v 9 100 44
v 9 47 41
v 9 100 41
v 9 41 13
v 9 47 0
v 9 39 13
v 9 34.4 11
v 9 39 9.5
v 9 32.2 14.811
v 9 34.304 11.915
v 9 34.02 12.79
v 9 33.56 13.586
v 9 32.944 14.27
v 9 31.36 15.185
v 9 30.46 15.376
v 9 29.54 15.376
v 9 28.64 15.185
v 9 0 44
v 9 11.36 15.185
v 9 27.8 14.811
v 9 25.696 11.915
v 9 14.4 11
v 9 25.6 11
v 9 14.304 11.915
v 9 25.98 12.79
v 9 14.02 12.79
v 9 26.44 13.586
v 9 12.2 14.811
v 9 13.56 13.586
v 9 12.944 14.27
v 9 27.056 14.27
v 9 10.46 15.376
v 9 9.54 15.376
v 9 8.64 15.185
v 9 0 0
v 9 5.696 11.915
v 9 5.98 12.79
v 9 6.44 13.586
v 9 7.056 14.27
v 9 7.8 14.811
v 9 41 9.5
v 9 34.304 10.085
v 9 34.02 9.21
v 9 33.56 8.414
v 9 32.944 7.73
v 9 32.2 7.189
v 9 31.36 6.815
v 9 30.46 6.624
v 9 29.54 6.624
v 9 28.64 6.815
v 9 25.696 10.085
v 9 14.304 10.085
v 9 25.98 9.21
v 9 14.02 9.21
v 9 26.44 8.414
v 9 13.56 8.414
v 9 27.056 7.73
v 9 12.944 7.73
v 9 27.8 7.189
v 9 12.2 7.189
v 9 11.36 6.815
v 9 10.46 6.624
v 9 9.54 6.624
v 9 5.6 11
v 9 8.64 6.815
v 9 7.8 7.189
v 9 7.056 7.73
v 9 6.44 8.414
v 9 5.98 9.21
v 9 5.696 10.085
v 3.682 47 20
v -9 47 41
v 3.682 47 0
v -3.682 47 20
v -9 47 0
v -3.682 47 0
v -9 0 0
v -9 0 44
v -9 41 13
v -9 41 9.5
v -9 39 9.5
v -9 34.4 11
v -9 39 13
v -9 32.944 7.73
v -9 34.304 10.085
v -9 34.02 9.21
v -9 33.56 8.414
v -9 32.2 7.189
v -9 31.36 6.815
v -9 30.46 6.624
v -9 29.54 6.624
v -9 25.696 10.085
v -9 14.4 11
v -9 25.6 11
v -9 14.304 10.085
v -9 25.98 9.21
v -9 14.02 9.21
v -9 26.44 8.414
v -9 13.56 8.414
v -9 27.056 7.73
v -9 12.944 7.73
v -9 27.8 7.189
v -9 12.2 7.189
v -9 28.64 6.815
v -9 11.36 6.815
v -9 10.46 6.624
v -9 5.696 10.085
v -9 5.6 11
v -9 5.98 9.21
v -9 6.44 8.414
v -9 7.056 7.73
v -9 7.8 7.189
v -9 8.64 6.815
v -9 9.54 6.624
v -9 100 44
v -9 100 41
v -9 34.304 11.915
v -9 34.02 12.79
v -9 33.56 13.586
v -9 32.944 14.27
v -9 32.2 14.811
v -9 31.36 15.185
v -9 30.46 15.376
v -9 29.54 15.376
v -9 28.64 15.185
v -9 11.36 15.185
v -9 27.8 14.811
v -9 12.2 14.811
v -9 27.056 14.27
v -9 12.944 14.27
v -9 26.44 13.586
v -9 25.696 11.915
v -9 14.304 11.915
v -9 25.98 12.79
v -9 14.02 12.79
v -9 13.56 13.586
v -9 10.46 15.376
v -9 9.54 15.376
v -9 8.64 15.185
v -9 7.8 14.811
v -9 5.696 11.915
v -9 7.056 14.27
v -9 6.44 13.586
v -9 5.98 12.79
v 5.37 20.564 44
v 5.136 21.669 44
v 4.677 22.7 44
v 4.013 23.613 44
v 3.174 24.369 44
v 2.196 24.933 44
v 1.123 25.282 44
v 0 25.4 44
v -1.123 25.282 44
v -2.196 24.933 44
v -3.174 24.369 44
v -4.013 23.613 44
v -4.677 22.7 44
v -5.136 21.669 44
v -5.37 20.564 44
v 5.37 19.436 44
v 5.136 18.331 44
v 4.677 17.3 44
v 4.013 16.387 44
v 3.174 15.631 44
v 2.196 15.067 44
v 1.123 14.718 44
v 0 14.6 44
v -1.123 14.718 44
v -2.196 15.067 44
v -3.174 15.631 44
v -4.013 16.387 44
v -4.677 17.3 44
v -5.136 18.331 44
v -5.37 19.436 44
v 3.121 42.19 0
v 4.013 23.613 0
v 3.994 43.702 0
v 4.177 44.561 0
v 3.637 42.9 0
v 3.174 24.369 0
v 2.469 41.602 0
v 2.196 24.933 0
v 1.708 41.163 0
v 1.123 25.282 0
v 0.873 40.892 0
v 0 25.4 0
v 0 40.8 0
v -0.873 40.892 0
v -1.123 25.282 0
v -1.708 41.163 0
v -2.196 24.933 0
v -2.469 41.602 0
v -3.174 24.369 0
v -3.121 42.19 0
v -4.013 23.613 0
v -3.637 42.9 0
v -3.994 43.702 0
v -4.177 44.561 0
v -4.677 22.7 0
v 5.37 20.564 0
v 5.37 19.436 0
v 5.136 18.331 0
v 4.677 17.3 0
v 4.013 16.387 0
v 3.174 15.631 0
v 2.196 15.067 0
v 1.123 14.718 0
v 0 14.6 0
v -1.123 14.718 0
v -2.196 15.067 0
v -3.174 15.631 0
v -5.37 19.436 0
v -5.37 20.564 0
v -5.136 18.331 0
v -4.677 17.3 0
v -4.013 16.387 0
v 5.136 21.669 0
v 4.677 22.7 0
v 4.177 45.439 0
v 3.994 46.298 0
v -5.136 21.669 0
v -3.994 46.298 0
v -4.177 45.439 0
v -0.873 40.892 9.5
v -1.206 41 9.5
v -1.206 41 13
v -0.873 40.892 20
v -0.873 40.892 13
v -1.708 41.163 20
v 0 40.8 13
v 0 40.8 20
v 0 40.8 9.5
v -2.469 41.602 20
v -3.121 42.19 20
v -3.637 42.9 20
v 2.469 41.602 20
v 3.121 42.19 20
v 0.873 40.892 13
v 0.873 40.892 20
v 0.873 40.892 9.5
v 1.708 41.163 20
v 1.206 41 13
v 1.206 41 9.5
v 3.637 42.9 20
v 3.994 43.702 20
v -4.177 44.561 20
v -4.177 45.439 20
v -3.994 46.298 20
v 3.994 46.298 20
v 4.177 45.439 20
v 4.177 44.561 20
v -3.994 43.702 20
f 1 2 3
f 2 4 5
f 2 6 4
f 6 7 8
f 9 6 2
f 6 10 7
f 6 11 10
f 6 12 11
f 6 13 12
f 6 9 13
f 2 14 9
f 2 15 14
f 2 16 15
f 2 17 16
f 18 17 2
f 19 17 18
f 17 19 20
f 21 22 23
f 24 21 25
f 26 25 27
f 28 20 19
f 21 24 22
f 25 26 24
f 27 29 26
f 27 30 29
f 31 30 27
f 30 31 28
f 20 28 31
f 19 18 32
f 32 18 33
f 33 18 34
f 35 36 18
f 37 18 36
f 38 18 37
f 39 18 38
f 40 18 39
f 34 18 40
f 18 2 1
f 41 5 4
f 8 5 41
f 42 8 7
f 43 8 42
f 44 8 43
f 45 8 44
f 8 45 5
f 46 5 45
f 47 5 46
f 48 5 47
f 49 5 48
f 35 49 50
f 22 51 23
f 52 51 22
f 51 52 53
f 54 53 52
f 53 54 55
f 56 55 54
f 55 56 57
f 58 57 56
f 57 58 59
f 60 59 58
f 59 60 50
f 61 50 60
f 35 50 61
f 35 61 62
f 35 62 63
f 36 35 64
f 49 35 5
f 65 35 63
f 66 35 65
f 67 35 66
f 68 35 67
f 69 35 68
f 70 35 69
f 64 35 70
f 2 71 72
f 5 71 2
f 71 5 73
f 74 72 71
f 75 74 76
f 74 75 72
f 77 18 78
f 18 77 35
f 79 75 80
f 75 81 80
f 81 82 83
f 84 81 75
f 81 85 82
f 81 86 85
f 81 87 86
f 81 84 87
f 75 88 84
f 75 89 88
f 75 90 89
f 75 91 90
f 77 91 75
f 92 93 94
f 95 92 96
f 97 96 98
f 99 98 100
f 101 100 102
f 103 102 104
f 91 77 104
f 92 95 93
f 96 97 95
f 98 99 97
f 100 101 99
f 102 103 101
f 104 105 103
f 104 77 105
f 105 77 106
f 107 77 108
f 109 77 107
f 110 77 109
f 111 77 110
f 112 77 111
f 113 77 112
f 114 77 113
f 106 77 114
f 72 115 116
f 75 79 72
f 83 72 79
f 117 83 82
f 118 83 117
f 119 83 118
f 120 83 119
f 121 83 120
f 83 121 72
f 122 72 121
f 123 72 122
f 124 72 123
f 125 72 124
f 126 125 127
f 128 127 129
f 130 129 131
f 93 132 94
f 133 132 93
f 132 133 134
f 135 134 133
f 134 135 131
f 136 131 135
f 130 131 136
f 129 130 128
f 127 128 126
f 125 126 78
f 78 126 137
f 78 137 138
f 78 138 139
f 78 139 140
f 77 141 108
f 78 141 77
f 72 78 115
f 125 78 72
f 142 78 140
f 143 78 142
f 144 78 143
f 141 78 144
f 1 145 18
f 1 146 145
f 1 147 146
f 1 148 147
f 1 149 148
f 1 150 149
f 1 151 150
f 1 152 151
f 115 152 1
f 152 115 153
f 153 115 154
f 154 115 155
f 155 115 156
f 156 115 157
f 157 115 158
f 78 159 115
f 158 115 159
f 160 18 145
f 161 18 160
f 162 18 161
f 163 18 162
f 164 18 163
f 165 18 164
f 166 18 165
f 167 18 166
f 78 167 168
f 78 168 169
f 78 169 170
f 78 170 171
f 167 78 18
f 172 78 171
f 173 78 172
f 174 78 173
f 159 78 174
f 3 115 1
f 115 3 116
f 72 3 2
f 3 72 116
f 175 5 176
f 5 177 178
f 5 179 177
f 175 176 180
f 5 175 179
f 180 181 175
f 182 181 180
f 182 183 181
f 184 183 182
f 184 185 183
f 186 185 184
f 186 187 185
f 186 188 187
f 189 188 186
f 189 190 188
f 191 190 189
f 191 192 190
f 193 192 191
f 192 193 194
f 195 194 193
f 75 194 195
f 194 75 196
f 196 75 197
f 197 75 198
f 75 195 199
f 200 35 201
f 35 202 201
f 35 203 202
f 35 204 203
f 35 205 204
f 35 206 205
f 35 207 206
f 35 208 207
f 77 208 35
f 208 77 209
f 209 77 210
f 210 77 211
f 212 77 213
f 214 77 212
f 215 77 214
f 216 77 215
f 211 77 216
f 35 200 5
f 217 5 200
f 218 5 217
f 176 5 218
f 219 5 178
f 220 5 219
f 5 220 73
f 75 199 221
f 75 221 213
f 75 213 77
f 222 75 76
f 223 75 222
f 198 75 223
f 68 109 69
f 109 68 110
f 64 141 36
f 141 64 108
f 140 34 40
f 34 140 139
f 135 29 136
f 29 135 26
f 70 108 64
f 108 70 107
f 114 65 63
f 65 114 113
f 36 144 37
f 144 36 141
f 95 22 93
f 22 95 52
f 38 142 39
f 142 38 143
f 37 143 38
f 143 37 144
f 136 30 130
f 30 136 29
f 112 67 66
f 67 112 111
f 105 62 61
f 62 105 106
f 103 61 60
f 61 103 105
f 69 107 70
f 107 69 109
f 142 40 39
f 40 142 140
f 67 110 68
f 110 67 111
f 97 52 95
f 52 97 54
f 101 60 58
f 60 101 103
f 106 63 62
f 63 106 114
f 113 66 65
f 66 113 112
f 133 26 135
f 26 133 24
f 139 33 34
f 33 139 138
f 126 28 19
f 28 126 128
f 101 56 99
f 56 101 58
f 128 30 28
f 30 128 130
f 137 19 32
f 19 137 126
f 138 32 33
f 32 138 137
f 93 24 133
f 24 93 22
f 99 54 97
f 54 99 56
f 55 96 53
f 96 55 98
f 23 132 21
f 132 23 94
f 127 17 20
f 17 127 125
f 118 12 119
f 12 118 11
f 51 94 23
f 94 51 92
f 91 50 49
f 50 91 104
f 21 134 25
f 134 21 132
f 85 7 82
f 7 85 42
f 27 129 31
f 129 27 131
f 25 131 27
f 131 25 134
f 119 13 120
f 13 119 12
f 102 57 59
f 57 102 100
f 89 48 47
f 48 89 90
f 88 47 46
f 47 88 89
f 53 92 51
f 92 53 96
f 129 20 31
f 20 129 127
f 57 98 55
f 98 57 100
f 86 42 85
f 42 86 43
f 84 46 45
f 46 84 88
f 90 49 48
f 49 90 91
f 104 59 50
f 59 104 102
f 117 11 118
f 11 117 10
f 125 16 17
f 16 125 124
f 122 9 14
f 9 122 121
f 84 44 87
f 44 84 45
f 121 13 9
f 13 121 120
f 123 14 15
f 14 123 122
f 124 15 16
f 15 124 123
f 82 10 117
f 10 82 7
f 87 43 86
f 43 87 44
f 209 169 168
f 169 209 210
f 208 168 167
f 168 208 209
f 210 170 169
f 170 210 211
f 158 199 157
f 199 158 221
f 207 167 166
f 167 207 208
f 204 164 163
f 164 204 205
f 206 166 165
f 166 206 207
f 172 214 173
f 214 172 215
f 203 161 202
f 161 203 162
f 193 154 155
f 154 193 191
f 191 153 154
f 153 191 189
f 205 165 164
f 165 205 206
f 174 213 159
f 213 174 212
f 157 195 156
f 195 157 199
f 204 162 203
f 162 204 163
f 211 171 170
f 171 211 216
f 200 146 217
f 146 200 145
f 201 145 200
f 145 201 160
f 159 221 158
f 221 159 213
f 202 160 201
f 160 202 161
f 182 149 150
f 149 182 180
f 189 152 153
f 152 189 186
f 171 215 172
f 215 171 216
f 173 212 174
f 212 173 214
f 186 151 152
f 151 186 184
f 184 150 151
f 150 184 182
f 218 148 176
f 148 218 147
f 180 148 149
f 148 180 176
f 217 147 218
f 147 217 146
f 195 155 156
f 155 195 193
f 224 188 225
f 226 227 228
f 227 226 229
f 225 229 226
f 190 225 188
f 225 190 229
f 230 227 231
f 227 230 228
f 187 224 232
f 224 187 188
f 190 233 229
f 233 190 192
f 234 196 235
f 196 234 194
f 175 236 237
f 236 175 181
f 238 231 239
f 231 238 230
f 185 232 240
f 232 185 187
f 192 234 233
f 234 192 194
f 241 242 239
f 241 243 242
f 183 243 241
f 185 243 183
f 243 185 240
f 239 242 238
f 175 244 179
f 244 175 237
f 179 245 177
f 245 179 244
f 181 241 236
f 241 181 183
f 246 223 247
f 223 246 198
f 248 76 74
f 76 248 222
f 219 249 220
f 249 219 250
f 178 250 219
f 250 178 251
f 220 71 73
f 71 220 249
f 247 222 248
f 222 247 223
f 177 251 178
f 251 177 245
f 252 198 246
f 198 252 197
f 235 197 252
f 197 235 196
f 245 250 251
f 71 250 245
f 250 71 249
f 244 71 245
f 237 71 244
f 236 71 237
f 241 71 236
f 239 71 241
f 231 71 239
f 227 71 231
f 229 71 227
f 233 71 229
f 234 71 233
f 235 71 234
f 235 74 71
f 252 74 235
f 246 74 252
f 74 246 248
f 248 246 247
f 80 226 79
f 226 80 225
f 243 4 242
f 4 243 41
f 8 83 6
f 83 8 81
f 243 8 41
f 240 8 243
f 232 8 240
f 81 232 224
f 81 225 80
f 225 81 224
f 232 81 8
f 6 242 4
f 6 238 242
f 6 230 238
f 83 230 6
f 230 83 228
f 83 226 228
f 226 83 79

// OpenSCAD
// PRUSA iteration3
// Y frame corners
// GNU GPL v3
// Josef Průša <iam@josefprusa.cz> and contributors
// http://www.reprap.org/wiki/Prusa_Mendel
// http://prusamendel.org


module glass_limits(){
 translate([-9,-11-22,0])cube([18,22,47]);
 translate([-9,-11-22,0])cube([18,3,100]);
// translate([-9,-11-22,100])cube([18,44,1]);
}


module corner_base(){	

 translate([-9,-11,0])cube([18,22,47]);
}

module corner_holes(){
 translate([-11,-11,0]){
  // Bottom hole
  translate([0,11,10]) rotate([0,90,0]) translate([0,0,-5]) cylinder(h = 270, r=4.4, $fn=30);
  // Top hole
  translate([0,11,30]) rotate([0,90,0]) translate([0,0,-5]) cylinder(h = 270, r=4.4, $fn=30);
  // Middle hole
  translate([11,0,20]) rotate([0,0,90]) rotate([0,90,0]) translate([0,0,-100]) cylinder(h = 270, r=5.4, $fn=30);



  // Top smooth rod insert
  // Smooth rod place
  translate([11,2,45]) rotate([0,90,90]) cylinder(h = 270, r=4.2, $fn=30); 
  // Ziptie
  translate([-5,9,39])  cube([30,3.5,2]);
 }
}




// Final part
module corner(){

 // Rotate the part for better printing
 translate([0,0,11]) rotate([-90,0,0]) difference(){
  union(){
   corner_base();
   glass_limits();
  }
  corner_holes();

 }
}


corner();
